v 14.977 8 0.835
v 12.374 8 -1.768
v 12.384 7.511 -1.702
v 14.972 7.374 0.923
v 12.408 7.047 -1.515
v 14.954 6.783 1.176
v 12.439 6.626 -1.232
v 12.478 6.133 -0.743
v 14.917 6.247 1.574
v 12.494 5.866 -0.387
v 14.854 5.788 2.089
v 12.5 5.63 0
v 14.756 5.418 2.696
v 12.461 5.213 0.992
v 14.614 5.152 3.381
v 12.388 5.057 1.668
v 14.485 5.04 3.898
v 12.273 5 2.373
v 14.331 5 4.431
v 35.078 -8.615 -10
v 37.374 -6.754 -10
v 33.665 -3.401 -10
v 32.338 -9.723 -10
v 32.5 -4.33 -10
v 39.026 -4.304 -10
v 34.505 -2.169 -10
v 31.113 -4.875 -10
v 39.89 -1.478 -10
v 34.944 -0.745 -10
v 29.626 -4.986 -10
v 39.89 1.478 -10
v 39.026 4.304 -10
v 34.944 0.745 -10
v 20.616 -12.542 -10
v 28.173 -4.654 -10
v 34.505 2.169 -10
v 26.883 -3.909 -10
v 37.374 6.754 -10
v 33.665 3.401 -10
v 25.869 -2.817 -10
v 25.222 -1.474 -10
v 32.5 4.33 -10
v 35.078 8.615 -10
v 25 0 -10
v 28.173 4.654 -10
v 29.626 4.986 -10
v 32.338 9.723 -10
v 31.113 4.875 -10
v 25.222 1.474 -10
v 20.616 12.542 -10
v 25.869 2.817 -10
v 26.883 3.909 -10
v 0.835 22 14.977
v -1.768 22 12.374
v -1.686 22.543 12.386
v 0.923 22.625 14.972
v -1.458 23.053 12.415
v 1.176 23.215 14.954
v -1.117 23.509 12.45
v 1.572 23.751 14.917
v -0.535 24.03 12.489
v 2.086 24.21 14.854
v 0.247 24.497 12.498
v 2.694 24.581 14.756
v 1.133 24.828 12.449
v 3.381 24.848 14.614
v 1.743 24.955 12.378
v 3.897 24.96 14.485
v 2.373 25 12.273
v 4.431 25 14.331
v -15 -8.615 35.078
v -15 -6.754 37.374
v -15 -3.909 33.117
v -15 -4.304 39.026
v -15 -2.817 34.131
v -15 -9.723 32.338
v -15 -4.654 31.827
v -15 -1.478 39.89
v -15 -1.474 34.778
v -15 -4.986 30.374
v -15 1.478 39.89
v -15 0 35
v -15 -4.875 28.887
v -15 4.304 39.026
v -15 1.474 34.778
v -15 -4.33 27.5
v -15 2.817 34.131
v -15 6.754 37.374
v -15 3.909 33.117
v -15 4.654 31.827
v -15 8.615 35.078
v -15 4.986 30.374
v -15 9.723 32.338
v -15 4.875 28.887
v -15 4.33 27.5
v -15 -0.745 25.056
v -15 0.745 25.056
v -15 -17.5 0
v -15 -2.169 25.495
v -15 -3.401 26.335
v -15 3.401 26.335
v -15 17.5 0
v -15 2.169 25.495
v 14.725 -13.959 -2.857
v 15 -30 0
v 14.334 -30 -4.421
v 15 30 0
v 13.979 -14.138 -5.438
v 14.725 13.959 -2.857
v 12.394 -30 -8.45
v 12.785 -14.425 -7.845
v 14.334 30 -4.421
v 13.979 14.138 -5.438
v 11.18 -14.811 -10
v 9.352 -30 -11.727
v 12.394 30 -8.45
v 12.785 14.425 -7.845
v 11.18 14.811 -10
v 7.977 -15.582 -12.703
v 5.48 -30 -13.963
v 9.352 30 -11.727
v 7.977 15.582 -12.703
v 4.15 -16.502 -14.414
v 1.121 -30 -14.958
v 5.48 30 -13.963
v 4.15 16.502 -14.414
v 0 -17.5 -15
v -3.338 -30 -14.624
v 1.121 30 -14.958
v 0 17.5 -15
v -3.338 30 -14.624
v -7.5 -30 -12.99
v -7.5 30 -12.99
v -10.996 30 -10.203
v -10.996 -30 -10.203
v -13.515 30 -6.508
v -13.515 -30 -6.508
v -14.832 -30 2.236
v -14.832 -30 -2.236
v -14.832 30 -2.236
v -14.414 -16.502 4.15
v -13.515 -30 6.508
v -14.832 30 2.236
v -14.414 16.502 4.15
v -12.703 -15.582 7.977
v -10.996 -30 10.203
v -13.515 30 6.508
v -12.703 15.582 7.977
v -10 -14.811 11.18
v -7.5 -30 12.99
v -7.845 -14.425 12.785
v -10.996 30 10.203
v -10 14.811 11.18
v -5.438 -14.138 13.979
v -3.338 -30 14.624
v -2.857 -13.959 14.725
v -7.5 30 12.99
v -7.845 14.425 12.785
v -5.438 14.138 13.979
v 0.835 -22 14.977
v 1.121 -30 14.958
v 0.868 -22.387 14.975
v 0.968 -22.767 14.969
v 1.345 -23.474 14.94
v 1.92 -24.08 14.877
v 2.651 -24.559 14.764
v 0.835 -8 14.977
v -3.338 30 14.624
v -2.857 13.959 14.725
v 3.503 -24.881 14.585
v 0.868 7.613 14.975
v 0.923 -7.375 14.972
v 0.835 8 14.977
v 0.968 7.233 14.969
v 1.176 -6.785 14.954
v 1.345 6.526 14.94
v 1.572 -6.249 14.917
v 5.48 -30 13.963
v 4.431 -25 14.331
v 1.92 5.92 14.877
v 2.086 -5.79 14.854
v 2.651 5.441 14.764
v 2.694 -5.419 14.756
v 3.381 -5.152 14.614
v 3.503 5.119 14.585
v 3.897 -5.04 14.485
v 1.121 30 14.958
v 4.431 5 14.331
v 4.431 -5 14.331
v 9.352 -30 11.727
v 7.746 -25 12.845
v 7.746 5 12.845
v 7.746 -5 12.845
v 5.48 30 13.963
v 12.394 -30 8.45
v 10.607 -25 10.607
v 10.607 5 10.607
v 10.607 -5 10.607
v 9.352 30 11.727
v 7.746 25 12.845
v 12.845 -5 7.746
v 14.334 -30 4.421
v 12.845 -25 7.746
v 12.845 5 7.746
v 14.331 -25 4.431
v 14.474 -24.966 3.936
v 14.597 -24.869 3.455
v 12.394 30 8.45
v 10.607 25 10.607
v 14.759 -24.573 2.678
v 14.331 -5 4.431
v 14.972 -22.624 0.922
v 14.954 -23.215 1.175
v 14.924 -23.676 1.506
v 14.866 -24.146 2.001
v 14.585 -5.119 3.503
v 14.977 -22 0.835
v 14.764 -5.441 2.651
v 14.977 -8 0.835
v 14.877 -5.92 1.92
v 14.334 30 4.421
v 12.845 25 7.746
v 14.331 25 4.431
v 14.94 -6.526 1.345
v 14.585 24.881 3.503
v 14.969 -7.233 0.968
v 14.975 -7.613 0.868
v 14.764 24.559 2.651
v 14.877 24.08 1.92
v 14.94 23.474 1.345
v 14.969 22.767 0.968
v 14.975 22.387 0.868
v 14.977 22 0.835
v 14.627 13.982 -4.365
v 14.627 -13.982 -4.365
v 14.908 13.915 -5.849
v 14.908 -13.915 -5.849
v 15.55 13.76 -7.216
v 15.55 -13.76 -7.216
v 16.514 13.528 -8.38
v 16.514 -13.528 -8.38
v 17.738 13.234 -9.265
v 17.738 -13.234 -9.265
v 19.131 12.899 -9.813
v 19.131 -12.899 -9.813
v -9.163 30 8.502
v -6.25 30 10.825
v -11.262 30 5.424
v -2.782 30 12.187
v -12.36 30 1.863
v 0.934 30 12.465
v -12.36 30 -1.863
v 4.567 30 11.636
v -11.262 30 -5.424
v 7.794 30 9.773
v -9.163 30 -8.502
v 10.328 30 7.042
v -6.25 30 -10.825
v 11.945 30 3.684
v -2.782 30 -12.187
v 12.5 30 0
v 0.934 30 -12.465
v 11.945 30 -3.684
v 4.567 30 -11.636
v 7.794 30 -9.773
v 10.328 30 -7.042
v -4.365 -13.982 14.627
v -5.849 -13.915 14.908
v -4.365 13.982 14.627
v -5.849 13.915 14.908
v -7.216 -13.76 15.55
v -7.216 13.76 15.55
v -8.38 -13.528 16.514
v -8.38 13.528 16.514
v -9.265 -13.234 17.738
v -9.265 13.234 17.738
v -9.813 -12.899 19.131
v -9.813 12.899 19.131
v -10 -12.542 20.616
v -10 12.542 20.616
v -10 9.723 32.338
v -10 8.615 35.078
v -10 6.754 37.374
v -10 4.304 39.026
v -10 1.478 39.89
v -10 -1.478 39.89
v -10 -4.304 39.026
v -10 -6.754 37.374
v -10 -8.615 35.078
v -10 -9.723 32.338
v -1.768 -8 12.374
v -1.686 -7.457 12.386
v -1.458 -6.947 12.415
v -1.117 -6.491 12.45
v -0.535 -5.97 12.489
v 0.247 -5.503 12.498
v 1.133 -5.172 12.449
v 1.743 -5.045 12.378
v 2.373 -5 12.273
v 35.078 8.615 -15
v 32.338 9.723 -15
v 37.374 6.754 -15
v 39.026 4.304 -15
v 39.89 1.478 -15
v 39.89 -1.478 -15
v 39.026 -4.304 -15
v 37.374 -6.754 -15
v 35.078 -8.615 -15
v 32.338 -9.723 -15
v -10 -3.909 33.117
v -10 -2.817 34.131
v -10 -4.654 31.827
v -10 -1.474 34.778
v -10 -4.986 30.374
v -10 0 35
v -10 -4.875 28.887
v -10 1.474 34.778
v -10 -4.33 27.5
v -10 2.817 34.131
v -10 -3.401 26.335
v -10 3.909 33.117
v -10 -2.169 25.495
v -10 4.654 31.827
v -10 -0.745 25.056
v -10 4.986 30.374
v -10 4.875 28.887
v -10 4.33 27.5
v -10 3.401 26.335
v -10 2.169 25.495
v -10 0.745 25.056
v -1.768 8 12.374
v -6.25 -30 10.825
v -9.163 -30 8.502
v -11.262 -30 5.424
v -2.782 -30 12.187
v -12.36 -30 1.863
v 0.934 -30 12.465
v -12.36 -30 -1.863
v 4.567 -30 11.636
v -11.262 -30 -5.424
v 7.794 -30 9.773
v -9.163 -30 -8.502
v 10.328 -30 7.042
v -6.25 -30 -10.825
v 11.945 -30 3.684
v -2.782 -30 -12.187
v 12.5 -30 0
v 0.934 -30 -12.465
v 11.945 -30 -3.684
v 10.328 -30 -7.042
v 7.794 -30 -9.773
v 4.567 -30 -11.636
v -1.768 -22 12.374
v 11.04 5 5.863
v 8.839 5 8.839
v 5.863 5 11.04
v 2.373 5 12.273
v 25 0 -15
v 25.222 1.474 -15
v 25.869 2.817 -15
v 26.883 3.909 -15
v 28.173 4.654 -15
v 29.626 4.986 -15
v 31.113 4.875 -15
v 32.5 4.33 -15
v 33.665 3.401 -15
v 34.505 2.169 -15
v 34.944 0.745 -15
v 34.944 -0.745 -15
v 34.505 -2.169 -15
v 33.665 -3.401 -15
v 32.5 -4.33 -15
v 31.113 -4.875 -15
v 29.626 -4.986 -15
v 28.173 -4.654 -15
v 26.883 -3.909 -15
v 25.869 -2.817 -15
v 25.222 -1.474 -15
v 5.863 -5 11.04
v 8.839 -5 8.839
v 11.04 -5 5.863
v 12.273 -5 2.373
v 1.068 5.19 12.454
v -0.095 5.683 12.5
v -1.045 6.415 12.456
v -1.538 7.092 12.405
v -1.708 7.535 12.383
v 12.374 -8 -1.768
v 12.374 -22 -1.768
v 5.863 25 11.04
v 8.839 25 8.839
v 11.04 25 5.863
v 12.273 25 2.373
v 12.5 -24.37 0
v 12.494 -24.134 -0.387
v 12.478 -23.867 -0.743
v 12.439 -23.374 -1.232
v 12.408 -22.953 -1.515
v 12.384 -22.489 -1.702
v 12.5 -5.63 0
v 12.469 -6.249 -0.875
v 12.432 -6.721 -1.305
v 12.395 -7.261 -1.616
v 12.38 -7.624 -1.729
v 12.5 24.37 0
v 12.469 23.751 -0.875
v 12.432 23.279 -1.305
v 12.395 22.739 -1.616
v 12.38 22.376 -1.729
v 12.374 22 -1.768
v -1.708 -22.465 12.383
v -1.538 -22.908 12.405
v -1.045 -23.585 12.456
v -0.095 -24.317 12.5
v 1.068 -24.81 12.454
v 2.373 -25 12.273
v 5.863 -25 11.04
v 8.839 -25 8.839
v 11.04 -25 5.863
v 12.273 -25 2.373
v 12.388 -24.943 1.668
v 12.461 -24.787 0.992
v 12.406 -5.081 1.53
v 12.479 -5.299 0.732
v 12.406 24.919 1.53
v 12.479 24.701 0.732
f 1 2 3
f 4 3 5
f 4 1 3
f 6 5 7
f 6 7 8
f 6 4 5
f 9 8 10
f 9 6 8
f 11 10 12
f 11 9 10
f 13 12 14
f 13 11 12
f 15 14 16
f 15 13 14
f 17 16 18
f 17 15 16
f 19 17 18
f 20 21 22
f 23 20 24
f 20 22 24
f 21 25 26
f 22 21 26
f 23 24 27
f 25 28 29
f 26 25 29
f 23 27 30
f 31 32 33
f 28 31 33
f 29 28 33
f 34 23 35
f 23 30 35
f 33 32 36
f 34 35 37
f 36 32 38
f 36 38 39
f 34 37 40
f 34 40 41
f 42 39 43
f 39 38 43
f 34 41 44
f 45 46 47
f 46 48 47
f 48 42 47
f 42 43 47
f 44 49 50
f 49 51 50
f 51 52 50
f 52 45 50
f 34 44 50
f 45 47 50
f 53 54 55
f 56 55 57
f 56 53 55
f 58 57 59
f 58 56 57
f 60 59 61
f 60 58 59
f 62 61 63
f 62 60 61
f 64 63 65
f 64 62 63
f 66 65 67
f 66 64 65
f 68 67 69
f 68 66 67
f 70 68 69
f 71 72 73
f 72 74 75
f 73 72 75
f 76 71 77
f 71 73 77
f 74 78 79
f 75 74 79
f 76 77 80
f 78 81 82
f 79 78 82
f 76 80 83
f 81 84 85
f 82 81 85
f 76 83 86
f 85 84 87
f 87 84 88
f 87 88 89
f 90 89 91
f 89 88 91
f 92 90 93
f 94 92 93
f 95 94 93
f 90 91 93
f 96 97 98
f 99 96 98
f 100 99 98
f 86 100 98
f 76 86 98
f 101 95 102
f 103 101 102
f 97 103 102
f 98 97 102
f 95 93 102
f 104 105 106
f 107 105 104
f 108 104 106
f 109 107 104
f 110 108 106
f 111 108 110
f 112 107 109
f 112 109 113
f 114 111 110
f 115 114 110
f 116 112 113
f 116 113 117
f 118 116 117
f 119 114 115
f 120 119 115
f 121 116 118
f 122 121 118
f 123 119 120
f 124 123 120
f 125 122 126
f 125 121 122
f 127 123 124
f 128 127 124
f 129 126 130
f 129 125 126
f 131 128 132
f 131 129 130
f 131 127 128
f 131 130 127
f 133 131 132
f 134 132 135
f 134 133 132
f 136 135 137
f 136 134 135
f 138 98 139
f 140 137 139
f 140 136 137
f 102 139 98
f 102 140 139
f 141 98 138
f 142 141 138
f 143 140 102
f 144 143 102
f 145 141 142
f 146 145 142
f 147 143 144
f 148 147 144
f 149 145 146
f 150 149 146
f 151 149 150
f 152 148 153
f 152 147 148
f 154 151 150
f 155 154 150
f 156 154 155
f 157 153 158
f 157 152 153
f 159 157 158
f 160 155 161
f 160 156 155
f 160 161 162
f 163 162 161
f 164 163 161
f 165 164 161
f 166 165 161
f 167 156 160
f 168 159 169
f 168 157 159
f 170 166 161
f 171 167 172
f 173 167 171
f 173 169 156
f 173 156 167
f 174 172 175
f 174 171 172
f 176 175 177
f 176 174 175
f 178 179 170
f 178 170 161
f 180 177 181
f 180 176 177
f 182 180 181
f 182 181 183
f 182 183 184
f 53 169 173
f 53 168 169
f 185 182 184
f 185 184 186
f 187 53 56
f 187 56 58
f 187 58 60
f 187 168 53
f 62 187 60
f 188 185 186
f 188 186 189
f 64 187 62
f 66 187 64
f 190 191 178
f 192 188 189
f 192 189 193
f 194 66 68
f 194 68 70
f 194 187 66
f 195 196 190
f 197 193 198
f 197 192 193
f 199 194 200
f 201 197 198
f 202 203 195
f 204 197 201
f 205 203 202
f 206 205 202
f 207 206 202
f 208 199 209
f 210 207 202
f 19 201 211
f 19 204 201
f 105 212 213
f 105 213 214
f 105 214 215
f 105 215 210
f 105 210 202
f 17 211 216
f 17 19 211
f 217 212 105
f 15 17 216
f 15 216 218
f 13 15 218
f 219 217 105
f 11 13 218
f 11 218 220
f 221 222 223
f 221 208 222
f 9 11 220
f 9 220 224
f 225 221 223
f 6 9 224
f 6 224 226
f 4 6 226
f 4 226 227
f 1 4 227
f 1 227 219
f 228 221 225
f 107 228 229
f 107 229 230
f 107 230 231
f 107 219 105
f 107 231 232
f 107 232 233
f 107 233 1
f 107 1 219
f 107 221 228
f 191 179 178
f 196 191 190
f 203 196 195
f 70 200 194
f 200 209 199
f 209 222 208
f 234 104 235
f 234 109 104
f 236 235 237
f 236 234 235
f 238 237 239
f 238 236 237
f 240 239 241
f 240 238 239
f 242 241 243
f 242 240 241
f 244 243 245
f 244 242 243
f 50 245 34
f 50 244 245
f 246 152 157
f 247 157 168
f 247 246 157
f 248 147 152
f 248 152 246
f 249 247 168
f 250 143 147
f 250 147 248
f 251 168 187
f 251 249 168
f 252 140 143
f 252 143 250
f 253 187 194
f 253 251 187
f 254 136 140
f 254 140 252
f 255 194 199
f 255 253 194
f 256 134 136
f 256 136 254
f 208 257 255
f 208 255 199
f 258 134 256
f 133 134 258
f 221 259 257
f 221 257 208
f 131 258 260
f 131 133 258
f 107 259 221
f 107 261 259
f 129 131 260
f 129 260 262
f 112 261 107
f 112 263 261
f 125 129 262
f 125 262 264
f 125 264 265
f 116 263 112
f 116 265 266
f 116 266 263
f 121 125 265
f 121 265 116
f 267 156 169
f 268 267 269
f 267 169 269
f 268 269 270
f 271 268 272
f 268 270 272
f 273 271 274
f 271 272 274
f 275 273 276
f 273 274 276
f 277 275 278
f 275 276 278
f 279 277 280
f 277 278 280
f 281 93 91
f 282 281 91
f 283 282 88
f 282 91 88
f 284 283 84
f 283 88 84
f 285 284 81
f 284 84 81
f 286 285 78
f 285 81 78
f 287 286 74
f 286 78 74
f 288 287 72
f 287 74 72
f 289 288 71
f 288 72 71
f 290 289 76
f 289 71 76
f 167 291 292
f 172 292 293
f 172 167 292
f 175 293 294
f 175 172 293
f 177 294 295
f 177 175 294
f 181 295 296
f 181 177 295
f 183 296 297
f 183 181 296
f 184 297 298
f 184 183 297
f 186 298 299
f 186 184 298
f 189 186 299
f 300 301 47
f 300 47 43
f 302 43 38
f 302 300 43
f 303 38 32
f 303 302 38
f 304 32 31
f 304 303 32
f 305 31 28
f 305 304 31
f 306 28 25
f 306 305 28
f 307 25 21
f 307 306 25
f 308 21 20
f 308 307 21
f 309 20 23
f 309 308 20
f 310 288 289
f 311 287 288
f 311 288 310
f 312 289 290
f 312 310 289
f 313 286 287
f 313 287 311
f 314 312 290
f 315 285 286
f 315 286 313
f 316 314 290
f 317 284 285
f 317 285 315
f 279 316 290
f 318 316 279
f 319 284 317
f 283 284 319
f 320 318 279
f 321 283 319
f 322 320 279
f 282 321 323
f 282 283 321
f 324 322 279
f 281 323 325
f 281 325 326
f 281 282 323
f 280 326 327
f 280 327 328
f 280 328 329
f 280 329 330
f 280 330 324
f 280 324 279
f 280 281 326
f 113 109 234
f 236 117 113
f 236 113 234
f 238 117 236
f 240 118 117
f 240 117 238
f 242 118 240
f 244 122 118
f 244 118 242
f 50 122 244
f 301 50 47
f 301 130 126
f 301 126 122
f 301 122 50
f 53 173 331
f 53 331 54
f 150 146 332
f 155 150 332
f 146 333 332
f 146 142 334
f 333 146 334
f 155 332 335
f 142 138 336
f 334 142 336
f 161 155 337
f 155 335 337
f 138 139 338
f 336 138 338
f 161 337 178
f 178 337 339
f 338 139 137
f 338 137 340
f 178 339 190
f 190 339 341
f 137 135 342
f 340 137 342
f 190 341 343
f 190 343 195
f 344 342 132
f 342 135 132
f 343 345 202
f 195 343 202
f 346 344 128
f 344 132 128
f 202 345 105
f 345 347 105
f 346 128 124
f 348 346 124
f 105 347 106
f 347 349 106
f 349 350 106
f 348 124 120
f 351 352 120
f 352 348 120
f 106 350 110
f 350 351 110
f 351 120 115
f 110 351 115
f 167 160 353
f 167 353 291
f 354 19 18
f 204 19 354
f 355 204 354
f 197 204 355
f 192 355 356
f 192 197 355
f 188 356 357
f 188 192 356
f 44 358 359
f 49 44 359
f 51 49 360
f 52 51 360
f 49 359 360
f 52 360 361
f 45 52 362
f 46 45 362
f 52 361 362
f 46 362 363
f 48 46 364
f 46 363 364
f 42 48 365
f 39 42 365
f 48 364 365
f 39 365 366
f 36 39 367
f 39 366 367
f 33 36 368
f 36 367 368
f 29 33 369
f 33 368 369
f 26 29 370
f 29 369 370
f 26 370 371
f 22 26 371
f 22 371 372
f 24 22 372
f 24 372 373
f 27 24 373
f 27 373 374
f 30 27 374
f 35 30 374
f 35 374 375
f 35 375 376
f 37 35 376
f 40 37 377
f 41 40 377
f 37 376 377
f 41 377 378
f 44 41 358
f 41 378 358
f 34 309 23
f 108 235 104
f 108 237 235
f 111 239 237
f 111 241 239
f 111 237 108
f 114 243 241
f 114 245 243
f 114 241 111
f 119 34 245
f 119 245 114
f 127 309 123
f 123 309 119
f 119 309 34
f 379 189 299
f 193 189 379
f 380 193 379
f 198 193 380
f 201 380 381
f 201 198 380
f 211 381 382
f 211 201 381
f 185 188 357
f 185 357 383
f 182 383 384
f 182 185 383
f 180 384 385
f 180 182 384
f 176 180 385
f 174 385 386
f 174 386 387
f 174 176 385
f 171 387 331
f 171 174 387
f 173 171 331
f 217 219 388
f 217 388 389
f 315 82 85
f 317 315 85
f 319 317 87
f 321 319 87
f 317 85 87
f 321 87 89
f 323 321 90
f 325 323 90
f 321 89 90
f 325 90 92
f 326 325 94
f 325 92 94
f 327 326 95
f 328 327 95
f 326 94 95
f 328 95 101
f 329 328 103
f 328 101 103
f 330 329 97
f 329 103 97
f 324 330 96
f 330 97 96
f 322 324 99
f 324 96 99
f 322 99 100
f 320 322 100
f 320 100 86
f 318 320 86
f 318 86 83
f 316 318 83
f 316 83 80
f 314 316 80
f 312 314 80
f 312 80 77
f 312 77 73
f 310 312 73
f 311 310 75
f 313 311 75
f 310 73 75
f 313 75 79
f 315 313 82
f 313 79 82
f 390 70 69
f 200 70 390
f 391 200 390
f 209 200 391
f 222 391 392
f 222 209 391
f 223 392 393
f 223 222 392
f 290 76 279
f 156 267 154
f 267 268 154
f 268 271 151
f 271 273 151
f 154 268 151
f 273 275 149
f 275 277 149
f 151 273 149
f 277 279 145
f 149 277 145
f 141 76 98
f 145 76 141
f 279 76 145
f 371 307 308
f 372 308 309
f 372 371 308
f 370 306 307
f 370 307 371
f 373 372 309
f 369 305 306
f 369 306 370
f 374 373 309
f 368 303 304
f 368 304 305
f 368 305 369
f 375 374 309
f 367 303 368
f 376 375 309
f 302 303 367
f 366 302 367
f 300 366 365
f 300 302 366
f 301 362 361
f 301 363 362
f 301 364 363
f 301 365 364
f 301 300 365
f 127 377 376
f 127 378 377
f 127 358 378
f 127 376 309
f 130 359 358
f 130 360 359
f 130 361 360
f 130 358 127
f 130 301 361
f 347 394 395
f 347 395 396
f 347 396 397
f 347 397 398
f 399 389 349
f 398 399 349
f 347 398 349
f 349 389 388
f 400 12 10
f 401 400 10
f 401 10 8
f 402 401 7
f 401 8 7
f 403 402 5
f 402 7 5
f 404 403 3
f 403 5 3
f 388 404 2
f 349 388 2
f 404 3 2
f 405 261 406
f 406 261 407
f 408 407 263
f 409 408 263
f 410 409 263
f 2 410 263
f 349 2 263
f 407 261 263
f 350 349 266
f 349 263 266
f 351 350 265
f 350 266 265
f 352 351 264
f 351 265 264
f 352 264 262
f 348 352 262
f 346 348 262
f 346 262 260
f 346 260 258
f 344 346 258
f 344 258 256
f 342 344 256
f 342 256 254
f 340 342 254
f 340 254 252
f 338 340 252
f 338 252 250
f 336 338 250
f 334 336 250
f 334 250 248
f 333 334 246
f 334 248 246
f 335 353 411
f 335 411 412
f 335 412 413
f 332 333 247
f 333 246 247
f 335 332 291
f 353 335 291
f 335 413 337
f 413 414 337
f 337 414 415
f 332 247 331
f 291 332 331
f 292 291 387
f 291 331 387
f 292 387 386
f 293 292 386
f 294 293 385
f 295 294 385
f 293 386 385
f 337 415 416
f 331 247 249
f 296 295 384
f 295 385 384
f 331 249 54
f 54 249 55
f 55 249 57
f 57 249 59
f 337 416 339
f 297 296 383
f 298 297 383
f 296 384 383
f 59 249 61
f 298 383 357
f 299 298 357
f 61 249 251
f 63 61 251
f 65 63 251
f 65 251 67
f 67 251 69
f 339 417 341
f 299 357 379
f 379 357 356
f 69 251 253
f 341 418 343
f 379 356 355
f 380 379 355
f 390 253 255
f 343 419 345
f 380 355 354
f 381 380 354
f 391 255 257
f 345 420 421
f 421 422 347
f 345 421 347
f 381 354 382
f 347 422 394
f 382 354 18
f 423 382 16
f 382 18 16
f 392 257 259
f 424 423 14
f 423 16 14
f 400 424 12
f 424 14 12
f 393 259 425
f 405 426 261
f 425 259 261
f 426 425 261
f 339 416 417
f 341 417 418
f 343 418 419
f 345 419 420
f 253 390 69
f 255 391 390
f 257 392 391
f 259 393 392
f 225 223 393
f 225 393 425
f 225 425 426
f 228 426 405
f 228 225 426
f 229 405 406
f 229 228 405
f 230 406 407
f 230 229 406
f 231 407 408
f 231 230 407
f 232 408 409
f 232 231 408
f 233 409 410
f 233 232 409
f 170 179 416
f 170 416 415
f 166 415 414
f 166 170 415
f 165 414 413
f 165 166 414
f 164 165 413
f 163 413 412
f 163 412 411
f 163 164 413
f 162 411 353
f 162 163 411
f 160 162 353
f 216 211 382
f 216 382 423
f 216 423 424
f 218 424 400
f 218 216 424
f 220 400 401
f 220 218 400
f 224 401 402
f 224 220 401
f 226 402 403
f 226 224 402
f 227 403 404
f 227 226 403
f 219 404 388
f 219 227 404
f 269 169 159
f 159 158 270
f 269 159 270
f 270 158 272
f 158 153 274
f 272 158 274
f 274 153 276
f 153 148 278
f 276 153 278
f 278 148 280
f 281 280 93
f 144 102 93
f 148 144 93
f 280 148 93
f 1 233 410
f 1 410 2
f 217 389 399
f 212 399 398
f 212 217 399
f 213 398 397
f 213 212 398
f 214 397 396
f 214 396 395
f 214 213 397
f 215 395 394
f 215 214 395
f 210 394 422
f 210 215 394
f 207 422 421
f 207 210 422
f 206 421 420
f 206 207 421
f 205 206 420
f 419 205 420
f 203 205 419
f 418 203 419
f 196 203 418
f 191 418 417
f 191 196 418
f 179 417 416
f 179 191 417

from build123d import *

# Parameters (mm, degrees)
SKETCH_1_R               = 15
EXTRUDE_3_DEPTH          = 30
SKETCH_4_R               = 5
EXTRUDE_4_DEPTH          = 5
SKETCH_5_R               = 5
EXTRUDE_5_DEPTH          = 5
FILLET_1_R               = 6
SKETCH_1_3_R             = 12.5
CUT_EXTRUDE_4_DEPTH      = 31
CUT_EXTRUDE_4_DEPTH_BACK = 31
CUT_EXTRUDE_3_REACH      = 38.213


with BuildPart() as part:
    # 草圖1 → 填料-伸長3 (new body, symmetric)
    with BuildSketch(Plane(origin=(0, 0, 0), x_dir=(1, 0, 0), z_dir=(0, 1, 0))):
        Circle(SKETCH_1_R)
    extrude(amount=EXTRUDE_3_DEPTH, both=True)

    # 草圖4 → 填料-伸長4 (add)
    with BuildSketch(Plane.ZY.offset(15)):
        with BuildLine():
            Line((0, -17.5), (0, 17.5))
            Line((0, 17.5), (32.338287195, 9.722778049))
            ThreePointArc((32.338287195, 9.722778049), (40, 0), (32.338287195, -9.722778049))
            Line((32.338287195, -9.722778049), (0, -17.5))
        make_face()
        with Locations((30, 0)):
            Circle(SKETCH_4_R, mode=Mode.SUBTRACT)
    extrude(amount=-EXTRUDE_4_DEPTH)

    # 草圖5 → 填料-伸長5 (add)
    with BuildSketch(Plane(origin=(0, 0, -15), x_dir=(-1, 0, 0), z_dir=(0, 0, -1))):
        with BuildLine():
            Line((0, -17.5), (0, 17.5))
            Line((0, 17.5), (-32.338287195, 9.722778049))
            ThreePointArc((-32.338287195, 9.722778049), (-40, 0), (-32.338287195, -9.722778049))
            Line((-32.338287195, -9.722778049), (0, -17.5))
        make_face()
        with Locations((-30, 0)):
            Circle(SKETCH_5_R, mode=Mode.SUBTRACT)
    extrude(amount=-EXTRUDE_5_DEPTH)

    # 圓角1
    fillet_1_edges = [part.edges().sort_by_distance(p)[0] for p in [
        (11.180339887, 0, -10),
        (-10, 0, 11.180339887),
    ]]
    fillet(fillet_1_edges, radius=FILLET_1_R)

    # 草圖1<3> → 除料-伸長4 (cut, two sides)
    with BuildSketch(Plane(origin=(0, 0, 0), x_dir=(1, 0, 0), z_dir=(0, 1, 0))) as cut_extrude_4_sk:
        Circle(SKETCH_1_3_R)
    extrude(amount=CUT_EXTRUDE_4_DEPTH, mode=Mode.SUBTRACT)
    extrude(cut_extrude_4_sk.sketch, amount=-CUT_EXTRUDE_4_DEPTH_BACK, mode=Mode.SUBTRACT)

    # 草圖7 → 除料-伸長3 (cut, up to next)
    with BuildSketch(Plane(origin=(10.606601718, 0, 10.606601718), x_dir=(0.707106781, 0, -0.707106781), z_dir=(0.707106781, 0, 0.707106781)), mode=Mode.PRIVATE) as cut_extrude_3_sk1:
        with BuildLine():
            Line((-7, 25), (7, 25))
            ThreePointArc((7, 25), (9.121320344, 24.121320344), (10, 22))
            Line((10, 22), (10, 8))
            ThreePointArc((10, 8), (9.121320344, 5.878679656), (7, 5))
            Line((7, 5), (-7, 5))
            ThreePointArc((-7, 5), (-9.121320344, 5.878679656), (-10, 8))
            Line((-10, 8), (-10, 22))
            ThreePointArc((-10, 22), (-9.121320344, 24.121320344), (-7, 25))
        make_face()
    cut_extrude_3_tool1 = extrude(cut_extrude_3_sk1.sketch, amount=-CUT_EXTRUDE_3_REACH, mode=Mode.PRIVATE) & part.part
    add(cut_extrude_3_tool1.solids().sort_by_distance((10.606602, 15, 10.606602))[0], mode=Mode.SUBTRACT)
    # 草圖7 → 除料-伸長3 (cut, up to next)
    with BuildSketch(Plane(origin=(10.606601718, 0, 10.606601718), x_dir=(0.707106781, 0, -0.707106781), z_dir=(0.707106781, 0, 0.707106781)), mode=Mode.PRIVATE) as cut_extrude_3_sk2:
        with BuildLine():
            Line((-7, -5), (7, -5))
            ThreePointArc((7, -5), (9.121320344, -5.878679656), (10, -8))
            Line((10, -8), (10, -22))
            ThreePointArc((10, -22), (9.121320344, -24.121320344), (7, -25))
            Line((7, -25), (-7, -25))
            ThreePointArc((-7, -25), (-9.121320344, -24.121320344), (-10, -22))
            Line((-10, -22), (-10, -8))
            ThreePointArc((-10, -8), (-9.121320344, -5.878679656), (-7, -5))
        make_face()
    cut_extrude_3_tool2 = extrude(cut_extrude_3_sk2.sketch, amount=-CUT_EXTRUDE_3_REACH, mode=Mode.PRIVATE) & part.part
    add(cut_extrude_3_tool2.solids().sort_by_distance((10.606602, -15, 10.606602))[0], mode=Mode.SUBTRACT)


solid = part.part
